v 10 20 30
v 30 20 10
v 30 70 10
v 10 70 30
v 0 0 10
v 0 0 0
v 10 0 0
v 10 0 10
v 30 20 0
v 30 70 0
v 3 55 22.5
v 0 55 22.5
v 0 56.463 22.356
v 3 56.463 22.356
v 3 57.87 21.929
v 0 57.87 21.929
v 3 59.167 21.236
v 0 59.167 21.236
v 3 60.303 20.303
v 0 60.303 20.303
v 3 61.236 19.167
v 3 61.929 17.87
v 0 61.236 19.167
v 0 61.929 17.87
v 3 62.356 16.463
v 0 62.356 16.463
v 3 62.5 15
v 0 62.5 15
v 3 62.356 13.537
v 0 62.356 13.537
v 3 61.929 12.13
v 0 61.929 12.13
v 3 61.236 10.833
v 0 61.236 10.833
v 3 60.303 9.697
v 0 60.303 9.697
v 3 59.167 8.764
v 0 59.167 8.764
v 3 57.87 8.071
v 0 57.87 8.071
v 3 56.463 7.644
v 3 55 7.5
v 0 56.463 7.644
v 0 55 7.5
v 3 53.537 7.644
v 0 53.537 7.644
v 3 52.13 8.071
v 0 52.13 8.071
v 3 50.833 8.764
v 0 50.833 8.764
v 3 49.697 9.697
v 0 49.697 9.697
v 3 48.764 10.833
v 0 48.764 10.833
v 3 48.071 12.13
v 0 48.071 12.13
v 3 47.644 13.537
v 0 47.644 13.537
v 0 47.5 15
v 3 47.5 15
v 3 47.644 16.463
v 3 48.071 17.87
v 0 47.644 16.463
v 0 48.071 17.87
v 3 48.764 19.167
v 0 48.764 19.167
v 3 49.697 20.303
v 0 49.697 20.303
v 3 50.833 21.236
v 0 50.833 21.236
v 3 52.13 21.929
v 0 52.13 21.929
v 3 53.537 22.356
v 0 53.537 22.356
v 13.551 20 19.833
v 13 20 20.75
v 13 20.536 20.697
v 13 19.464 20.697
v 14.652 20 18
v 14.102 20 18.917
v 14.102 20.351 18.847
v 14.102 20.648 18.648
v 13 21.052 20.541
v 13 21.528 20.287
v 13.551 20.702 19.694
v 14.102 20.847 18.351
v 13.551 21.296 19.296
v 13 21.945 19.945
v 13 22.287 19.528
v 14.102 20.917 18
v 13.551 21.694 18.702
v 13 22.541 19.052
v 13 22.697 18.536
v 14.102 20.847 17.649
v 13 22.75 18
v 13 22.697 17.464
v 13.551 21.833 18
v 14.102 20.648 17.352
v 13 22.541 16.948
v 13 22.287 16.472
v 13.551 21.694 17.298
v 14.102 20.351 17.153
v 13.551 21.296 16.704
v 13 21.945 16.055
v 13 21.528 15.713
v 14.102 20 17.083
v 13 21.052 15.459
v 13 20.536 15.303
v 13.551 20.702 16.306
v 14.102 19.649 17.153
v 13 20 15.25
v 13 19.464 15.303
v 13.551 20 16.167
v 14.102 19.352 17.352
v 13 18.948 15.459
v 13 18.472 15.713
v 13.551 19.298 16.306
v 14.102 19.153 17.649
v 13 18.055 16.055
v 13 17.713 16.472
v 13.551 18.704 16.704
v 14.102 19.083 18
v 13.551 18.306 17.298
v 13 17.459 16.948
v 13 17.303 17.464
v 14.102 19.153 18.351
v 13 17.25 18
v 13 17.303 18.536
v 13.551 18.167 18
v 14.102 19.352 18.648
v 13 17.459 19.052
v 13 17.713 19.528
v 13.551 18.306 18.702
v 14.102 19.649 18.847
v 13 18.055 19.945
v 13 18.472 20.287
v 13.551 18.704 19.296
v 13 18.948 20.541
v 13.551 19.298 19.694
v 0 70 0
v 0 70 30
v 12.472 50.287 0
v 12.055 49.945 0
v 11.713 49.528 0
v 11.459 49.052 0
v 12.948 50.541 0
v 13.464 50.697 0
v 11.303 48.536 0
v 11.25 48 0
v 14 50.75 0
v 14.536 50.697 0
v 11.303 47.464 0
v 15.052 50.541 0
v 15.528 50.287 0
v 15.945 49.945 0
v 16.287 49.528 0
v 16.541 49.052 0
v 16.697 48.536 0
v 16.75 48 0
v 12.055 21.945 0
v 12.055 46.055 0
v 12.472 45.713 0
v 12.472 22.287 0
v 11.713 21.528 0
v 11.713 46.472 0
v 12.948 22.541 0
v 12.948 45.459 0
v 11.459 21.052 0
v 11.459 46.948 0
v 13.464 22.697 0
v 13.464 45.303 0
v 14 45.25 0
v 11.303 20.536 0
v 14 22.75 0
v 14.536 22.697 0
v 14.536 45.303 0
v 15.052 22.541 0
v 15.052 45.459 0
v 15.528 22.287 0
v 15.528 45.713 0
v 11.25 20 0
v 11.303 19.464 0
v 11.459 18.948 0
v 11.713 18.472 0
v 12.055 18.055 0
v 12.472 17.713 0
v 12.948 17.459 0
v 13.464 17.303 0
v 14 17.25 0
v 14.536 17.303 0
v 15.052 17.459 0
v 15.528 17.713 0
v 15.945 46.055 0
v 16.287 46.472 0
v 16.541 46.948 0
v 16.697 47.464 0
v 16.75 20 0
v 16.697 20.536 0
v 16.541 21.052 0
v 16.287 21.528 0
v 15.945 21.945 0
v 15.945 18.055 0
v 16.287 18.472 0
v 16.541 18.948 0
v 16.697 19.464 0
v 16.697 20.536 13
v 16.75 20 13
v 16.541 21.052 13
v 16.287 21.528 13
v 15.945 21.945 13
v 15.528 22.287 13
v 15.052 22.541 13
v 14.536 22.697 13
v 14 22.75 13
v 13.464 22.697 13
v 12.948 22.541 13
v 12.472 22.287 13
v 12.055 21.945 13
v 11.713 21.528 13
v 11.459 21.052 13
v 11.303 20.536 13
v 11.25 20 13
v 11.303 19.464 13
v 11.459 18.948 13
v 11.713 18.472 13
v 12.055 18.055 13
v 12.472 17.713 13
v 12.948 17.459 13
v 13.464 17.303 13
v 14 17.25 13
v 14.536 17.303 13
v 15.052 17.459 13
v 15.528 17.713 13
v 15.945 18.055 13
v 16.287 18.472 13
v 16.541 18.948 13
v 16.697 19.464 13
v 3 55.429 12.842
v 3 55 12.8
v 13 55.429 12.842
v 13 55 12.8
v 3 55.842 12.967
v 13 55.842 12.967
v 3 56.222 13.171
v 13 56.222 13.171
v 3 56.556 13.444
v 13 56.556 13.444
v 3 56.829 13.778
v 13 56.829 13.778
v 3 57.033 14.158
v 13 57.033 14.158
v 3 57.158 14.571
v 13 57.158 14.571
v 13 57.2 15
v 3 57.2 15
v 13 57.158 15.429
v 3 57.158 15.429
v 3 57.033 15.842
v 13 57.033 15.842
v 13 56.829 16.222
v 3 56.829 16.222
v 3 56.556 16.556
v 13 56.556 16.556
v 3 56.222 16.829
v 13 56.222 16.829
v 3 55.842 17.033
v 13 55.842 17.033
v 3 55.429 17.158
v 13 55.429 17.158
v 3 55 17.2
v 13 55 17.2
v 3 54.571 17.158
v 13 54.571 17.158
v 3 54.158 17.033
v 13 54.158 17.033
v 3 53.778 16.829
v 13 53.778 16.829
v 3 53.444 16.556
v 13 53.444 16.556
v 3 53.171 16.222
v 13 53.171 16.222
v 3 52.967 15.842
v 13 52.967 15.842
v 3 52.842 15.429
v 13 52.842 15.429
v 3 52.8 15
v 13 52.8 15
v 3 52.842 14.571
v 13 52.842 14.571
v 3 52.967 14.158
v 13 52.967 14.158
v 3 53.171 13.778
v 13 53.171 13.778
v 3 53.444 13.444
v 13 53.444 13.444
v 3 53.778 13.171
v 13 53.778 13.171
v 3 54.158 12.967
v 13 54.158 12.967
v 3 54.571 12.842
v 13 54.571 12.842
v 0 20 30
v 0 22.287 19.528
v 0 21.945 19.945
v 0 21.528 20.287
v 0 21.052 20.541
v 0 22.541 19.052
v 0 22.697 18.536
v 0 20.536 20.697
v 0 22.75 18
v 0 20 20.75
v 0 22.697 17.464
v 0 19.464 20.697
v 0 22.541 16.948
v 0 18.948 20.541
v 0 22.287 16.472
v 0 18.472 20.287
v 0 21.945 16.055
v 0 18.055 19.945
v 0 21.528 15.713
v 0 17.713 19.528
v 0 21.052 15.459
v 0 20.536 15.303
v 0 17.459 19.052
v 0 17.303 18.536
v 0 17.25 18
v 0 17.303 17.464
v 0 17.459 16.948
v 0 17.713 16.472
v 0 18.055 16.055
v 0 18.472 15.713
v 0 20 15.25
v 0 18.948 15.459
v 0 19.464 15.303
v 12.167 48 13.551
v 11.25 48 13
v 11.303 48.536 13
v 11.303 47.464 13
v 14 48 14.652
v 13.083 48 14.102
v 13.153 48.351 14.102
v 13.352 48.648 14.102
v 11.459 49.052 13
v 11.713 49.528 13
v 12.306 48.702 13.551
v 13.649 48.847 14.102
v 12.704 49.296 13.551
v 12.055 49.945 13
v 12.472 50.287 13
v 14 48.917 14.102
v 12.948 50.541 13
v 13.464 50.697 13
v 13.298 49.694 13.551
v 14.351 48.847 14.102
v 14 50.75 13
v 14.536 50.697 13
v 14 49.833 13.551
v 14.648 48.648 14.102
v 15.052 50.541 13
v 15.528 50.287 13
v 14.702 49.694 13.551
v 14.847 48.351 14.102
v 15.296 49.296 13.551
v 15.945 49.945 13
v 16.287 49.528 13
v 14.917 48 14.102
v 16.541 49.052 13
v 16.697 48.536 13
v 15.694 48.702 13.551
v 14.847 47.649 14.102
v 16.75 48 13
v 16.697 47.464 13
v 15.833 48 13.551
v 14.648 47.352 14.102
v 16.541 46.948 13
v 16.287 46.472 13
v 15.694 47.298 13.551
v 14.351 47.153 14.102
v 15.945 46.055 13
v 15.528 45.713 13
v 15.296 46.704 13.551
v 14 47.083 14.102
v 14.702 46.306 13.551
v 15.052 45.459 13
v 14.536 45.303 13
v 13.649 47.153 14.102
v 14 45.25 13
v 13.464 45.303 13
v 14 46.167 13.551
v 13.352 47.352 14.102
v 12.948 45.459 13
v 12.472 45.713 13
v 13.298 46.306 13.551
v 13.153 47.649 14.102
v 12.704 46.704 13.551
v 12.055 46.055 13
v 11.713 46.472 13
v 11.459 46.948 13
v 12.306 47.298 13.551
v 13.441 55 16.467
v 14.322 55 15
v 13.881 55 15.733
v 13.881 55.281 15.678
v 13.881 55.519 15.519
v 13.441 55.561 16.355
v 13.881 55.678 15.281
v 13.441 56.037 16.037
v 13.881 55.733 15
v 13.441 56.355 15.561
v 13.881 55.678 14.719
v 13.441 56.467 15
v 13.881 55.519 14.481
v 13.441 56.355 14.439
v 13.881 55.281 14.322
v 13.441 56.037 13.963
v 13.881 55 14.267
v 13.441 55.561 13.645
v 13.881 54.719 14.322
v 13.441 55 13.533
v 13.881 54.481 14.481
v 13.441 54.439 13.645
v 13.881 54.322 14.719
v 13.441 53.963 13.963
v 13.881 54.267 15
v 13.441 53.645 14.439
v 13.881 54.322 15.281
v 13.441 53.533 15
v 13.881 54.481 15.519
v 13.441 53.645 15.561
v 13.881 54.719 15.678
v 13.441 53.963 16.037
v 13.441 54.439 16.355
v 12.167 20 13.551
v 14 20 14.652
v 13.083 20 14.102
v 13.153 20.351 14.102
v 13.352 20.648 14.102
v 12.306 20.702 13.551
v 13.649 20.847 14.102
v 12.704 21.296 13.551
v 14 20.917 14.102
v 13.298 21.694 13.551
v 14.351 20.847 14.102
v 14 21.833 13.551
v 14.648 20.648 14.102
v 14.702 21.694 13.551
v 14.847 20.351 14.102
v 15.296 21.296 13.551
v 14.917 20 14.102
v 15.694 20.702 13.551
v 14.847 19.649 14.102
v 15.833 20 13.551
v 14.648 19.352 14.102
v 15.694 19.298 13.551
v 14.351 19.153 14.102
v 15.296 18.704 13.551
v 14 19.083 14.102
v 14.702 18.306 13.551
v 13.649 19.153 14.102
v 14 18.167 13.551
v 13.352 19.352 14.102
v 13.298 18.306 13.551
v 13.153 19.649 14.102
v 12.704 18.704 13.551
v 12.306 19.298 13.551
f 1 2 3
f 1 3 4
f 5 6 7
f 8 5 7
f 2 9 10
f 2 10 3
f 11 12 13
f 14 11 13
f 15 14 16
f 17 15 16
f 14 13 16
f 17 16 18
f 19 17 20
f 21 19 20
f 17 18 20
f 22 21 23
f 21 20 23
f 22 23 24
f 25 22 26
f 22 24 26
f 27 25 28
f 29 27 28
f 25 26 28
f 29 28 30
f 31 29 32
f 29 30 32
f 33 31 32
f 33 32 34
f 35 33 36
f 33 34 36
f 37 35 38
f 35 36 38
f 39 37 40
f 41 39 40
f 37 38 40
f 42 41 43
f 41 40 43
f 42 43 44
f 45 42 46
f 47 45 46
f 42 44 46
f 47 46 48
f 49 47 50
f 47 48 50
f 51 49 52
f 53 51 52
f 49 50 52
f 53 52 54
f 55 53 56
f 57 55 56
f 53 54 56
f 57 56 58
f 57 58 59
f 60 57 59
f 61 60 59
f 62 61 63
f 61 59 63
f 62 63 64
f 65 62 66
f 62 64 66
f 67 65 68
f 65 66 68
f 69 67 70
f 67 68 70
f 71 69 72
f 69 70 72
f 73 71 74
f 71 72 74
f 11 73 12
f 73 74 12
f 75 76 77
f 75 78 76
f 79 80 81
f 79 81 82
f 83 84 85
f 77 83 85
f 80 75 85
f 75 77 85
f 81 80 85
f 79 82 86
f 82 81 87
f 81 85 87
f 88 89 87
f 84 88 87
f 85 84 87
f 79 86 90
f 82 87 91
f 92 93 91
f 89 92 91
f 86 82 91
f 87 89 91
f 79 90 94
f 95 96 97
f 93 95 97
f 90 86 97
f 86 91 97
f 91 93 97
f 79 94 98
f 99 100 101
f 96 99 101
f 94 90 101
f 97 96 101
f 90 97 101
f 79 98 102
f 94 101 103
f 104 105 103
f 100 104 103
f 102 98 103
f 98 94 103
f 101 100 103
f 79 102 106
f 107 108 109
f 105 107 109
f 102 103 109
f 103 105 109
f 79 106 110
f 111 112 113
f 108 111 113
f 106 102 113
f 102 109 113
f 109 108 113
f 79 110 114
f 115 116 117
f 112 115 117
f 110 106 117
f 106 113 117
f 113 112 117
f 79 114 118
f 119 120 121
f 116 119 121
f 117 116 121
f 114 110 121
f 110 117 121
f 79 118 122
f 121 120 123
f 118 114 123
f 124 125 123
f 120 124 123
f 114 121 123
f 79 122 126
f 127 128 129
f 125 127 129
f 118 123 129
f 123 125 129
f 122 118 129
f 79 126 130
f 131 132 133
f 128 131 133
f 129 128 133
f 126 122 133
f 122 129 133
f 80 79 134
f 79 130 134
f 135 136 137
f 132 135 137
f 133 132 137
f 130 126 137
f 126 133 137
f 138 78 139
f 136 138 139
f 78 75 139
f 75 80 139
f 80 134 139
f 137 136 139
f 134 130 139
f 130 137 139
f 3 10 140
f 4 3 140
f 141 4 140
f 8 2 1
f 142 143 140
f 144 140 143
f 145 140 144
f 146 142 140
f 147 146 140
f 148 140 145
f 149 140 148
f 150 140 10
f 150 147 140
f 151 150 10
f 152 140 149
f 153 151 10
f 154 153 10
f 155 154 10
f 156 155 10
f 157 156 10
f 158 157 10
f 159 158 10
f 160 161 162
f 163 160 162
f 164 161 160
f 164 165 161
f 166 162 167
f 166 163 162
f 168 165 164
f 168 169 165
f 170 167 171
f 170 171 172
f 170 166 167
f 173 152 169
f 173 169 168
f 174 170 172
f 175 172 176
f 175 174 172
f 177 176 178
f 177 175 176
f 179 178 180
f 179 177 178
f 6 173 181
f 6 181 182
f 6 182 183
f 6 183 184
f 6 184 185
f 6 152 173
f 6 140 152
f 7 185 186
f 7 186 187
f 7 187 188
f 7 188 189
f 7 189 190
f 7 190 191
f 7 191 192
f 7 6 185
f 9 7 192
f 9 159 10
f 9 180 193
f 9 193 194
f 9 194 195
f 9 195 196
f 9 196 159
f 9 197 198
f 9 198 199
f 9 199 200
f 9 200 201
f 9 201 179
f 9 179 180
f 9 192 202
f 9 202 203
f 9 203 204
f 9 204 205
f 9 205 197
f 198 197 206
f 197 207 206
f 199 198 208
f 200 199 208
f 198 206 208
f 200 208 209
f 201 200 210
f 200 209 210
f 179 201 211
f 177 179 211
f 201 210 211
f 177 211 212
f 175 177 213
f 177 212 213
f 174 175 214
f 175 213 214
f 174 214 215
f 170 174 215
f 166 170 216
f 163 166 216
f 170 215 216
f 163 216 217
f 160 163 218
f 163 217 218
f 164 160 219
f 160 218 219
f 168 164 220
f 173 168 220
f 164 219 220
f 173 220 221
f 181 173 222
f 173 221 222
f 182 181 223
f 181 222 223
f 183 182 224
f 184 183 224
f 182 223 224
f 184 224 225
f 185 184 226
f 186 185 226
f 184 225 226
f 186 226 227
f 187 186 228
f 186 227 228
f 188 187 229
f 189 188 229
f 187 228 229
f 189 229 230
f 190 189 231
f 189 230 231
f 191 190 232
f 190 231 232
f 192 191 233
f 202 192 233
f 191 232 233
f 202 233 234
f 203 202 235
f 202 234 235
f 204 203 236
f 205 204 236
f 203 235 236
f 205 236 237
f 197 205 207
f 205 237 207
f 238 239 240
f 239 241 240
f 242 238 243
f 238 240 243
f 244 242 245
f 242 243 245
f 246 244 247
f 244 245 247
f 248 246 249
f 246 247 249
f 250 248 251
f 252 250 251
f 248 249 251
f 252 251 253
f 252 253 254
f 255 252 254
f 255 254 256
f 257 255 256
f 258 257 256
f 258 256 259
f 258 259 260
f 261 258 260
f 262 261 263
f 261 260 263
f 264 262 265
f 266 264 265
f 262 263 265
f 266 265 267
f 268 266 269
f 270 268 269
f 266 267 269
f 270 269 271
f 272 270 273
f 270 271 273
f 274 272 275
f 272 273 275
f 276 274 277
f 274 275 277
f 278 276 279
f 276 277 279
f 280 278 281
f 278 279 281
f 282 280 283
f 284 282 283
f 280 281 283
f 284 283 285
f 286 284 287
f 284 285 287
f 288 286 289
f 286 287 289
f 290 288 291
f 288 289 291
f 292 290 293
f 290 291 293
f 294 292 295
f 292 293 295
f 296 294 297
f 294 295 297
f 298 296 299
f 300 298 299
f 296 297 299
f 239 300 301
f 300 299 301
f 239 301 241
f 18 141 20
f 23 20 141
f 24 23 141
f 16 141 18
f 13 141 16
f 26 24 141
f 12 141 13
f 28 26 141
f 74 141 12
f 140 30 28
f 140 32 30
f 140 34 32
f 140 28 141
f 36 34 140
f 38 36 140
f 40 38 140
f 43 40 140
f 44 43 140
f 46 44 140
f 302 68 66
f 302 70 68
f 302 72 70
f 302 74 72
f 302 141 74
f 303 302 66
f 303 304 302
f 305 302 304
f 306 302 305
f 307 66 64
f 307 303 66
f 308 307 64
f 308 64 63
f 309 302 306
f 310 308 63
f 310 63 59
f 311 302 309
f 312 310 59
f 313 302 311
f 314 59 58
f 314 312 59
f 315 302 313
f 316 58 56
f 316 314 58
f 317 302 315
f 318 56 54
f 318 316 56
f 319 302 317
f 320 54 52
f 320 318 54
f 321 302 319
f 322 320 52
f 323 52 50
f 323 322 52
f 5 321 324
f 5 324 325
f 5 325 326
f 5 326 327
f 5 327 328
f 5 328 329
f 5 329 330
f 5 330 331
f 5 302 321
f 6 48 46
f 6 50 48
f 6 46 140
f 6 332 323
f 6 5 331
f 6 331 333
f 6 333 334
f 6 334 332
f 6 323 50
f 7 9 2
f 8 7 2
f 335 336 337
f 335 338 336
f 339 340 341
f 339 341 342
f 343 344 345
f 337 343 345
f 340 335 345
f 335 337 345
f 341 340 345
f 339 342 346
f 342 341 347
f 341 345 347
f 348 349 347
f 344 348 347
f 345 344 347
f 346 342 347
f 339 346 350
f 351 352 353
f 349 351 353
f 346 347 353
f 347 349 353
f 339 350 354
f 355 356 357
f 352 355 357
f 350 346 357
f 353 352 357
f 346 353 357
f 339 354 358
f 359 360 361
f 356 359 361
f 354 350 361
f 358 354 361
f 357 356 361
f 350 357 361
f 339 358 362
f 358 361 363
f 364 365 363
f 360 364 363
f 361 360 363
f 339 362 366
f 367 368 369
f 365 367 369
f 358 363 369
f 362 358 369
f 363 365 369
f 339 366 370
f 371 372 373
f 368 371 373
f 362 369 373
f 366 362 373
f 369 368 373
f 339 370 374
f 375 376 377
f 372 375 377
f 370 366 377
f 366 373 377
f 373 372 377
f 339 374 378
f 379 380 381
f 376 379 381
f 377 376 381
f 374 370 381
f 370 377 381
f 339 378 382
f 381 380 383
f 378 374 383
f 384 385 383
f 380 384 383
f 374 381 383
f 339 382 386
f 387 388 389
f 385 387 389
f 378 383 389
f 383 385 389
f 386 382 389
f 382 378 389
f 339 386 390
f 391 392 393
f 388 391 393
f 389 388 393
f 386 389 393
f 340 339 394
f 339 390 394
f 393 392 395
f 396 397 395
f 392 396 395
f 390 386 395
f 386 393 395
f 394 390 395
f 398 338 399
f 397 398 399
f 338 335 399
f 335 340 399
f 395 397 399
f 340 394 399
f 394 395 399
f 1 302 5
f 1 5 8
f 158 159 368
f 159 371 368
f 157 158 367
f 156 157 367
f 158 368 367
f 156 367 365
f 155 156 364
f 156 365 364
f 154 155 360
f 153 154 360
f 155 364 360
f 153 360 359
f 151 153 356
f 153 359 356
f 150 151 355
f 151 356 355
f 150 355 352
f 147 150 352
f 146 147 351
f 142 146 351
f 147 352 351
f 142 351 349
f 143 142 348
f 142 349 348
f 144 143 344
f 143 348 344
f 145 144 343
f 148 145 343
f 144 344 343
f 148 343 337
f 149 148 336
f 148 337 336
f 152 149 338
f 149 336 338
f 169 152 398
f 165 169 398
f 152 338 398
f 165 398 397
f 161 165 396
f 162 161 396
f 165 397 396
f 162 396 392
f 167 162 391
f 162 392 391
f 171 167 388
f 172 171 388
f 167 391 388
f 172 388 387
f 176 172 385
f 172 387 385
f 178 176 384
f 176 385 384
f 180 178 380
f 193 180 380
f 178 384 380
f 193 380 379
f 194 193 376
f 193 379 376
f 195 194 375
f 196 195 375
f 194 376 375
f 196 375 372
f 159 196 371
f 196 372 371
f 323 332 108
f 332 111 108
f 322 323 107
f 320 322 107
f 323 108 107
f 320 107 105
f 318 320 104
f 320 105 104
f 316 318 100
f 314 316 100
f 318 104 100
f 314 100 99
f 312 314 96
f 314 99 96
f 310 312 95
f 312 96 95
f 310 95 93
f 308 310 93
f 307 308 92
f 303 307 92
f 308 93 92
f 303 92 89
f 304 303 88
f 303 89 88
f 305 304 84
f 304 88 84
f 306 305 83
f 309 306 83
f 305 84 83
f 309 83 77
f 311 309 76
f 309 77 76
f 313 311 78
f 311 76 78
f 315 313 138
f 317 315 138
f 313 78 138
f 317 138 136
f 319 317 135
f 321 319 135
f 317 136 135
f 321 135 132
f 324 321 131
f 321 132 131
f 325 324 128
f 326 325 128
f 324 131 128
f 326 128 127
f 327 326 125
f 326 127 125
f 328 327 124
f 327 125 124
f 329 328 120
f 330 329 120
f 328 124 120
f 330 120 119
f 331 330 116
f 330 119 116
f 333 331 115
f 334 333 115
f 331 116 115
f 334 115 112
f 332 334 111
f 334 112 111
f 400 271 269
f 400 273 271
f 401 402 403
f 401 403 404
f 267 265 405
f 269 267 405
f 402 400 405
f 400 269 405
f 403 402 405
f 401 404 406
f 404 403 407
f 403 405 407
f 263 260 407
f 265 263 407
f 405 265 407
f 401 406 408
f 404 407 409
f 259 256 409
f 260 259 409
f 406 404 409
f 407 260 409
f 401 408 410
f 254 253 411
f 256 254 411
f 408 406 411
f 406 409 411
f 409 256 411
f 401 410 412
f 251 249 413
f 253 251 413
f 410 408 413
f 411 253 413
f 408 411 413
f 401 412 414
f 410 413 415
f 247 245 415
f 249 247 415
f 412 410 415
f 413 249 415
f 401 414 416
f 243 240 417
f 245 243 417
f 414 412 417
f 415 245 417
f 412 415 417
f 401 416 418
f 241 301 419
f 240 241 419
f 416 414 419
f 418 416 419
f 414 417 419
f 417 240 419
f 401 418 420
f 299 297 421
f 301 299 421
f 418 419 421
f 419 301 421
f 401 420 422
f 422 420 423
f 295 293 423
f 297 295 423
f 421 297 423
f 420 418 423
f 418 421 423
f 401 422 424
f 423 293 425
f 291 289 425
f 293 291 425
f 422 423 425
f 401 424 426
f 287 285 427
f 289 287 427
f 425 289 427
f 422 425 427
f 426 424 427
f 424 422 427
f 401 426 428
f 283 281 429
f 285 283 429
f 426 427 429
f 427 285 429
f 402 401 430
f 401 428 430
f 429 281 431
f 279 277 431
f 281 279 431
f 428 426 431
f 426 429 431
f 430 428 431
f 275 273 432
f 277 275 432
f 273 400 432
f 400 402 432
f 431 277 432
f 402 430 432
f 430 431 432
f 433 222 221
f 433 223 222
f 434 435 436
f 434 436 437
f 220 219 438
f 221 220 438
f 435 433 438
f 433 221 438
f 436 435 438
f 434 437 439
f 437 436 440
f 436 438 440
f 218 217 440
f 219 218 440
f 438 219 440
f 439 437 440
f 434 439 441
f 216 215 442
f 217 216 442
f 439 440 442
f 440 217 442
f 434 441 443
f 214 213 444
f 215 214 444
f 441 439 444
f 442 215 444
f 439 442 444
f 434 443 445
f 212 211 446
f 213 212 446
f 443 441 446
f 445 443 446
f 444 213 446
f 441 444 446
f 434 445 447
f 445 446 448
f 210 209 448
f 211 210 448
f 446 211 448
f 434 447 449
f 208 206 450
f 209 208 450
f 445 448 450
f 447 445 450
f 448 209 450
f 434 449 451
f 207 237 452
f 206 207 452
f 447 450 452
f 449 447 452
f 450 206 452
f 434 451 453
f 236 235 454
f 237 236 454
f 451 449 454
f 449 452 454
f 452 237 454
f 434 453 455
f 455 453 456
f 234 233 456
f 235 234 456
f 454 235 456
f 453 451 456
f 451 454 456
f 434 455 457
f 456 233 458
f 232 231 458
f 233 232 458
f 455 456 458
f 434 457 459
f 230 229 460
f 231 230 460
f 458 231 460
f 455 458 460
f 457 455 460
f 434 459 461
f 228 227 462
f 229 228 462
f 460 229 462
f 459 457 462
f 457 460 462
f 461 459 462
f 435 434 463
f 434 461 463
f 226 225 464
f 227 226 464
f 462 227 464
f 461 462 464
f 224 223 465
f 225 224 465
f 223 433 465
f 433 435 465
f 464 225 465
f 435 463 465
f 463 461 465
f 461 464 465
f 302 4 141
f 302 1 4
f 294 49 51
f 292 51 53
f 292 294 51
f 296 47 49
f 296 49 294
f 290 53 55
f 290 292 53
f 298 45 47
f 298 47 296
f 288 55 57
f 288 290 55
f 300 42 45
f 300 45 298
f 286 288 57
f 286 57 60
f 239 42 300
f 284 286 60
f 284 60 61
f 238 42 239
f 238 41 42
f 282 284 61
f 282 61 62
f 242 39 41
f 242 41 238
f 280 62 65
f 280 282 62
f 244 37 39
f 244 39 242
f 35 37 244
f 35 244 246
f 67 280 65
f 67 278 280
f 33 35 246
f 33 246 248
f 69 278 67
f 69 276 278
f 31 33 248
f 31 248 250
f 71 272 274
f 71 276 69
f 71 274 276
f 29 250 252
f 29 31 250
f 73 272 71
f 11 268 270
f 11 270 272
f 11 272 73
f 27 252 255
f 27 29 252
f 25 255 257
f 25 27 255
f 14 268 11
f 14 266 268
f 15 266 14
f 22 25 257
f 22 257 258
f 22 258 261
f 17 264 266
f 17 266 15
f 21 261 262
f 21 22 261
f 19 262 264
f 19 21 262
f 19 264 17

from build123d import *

# Parameters (mm, degrees)
SCHIZZO1_W                   = 30
SCHIZZO1_H                   = 40
ESTRUSIONE_ESTRUSIONE1_DEPTH = 30
SMUSSO1_SIZE                 = 20
ESTRUSIONE_ESTRUSIONE2_DEPTH = 30
FORO_PER_VITE_M5_1_D         = 5.5
FORO_PER_VITE_M5_1_DEPTH     = 13
FORO_PER_VITE_M5_1_TIP       = 1.652366702
FORO_PER_VITE_M5_2_D         = 5.5
FORO_PER_VITE_M5_2_DEPTH     = 13
FORO_PER_VITE_M5_2_TIP       = 1.652366702
SCHIZZO6_R                   = 7.5
TAGLIO_ESTRUSIONE1_DEPTH     = 3
FORO_PER_VITE_M4_1_D         = 4.4
FORO_PER_VITE_M4_1_DEPTH     = 10
FORO_PER_VITE_M4_1_TIP       = 1.321893362


with BuildPart() as part:
    # Schizzo1 → Estrusione-Estrusione1 (new body)
    with BuildSketch(Plane.XY):
        with Locations((15, 20)):
            Rectangle(SCHIZZO1_W, SCHIZZO1_H)
    extrude(amount=ESTRUSIONE_ESTRUSIONE1_DEPTH)

    # Smusso1
    smusso1_edges = [part.edges().sort_by_distance(p)[0] for p in [
        (30, 20, 30),
        (30, 0, 15),
        (15, 0, 30),
    ]]
    chamfer(smusso1_edges, length=SMUSSO1_SIZE)

    # Schizzo2 → Estrusione-Estrusione2 (add)
    with BuildSketch(Plane(origin=(0, 40, 0), x_dir=(1, 0, 0), z_dir=(0, 1, 0))):
        Polygon((0, 0), (30, 0), (30, -10), (10, -30), (0, -30), align=None)
    extrude(amount=ESTRUSIONE_ESTRUSIONE2_DEPTH)

    # Foro per Vite M5-1
    with Locations(Plane.ZY):
        with Locations((18, 20)):
            Hole(FORO_PER_VITE_M5_1_D / 2, depth=FORO_PER_VITE_M5_1_DEPTH)
            with Locations((0, 0, -(FORO_PER_VITE_M5_1_DEPTH + FORO_PER_VITE_M5_1_TIP / 2))):  # 118° drill point
                Cone(0, FORO_PER_VITE_M5_1_D / 2, FORO_PER_VITE_M5_1_TIP, mode=Mode.SUBTRACT)

    # Foro per Vite M5-2
    with Locations(Plane(origin=(14, 20, 0), x_dir=(-1, 0, 0), z_dir=(0, 0, -1))):
        with Locations((0, 0), (0, 28)):
            Hole(FORO_PER_VITE_M5_2_D / 2, depth=FORO_PER_VITE_M5_2_DEPTH)
            with Locations((0, 0, -(FORO_PER_VITE_M5_2_DEPTH + FORO_PER_VITE_M5_2_TIP / 2))):  # 118° drill point
                Cone(0, FORO_PER_VITE_M5_2_D / 2, FORO_PER_VITE_M5_2_TIP, mode=Mode.SUBTRACT)

    # Schizzo6 → Taglio-Estrusione1 (cut)
    with BuildSketch(Plane.ZY):
        with Locations((15, 55)):
            Circle(SCHIZZO6_R)
    extrude(amount=-TAGLIO_ESTRUSIONE1_DEPTH, mode=Mode.SUBTRACT)

    # Foro per Vite M4-1
    with Locations(Plane.ZY.offset(-3)):
        with Locations((15, 55)):
            Hole(FORO_PER_VITE_M4_1_D / 2, depth=FORO_PER_VITE_M4_1_DEPTH)
            with Locations((0, 0, -(FORO_PER_VITE_M4_1_DEPTH + FORO_PER_VITE_M4_1_TIP / 2))):  # 118° drill point
                Cone(0, FORO_PER_VITE_M4_1_D / 2, FORO_PER_VITE_M4_1_TIP, mode=Mode.SUBTRACT)


solid = part.part
